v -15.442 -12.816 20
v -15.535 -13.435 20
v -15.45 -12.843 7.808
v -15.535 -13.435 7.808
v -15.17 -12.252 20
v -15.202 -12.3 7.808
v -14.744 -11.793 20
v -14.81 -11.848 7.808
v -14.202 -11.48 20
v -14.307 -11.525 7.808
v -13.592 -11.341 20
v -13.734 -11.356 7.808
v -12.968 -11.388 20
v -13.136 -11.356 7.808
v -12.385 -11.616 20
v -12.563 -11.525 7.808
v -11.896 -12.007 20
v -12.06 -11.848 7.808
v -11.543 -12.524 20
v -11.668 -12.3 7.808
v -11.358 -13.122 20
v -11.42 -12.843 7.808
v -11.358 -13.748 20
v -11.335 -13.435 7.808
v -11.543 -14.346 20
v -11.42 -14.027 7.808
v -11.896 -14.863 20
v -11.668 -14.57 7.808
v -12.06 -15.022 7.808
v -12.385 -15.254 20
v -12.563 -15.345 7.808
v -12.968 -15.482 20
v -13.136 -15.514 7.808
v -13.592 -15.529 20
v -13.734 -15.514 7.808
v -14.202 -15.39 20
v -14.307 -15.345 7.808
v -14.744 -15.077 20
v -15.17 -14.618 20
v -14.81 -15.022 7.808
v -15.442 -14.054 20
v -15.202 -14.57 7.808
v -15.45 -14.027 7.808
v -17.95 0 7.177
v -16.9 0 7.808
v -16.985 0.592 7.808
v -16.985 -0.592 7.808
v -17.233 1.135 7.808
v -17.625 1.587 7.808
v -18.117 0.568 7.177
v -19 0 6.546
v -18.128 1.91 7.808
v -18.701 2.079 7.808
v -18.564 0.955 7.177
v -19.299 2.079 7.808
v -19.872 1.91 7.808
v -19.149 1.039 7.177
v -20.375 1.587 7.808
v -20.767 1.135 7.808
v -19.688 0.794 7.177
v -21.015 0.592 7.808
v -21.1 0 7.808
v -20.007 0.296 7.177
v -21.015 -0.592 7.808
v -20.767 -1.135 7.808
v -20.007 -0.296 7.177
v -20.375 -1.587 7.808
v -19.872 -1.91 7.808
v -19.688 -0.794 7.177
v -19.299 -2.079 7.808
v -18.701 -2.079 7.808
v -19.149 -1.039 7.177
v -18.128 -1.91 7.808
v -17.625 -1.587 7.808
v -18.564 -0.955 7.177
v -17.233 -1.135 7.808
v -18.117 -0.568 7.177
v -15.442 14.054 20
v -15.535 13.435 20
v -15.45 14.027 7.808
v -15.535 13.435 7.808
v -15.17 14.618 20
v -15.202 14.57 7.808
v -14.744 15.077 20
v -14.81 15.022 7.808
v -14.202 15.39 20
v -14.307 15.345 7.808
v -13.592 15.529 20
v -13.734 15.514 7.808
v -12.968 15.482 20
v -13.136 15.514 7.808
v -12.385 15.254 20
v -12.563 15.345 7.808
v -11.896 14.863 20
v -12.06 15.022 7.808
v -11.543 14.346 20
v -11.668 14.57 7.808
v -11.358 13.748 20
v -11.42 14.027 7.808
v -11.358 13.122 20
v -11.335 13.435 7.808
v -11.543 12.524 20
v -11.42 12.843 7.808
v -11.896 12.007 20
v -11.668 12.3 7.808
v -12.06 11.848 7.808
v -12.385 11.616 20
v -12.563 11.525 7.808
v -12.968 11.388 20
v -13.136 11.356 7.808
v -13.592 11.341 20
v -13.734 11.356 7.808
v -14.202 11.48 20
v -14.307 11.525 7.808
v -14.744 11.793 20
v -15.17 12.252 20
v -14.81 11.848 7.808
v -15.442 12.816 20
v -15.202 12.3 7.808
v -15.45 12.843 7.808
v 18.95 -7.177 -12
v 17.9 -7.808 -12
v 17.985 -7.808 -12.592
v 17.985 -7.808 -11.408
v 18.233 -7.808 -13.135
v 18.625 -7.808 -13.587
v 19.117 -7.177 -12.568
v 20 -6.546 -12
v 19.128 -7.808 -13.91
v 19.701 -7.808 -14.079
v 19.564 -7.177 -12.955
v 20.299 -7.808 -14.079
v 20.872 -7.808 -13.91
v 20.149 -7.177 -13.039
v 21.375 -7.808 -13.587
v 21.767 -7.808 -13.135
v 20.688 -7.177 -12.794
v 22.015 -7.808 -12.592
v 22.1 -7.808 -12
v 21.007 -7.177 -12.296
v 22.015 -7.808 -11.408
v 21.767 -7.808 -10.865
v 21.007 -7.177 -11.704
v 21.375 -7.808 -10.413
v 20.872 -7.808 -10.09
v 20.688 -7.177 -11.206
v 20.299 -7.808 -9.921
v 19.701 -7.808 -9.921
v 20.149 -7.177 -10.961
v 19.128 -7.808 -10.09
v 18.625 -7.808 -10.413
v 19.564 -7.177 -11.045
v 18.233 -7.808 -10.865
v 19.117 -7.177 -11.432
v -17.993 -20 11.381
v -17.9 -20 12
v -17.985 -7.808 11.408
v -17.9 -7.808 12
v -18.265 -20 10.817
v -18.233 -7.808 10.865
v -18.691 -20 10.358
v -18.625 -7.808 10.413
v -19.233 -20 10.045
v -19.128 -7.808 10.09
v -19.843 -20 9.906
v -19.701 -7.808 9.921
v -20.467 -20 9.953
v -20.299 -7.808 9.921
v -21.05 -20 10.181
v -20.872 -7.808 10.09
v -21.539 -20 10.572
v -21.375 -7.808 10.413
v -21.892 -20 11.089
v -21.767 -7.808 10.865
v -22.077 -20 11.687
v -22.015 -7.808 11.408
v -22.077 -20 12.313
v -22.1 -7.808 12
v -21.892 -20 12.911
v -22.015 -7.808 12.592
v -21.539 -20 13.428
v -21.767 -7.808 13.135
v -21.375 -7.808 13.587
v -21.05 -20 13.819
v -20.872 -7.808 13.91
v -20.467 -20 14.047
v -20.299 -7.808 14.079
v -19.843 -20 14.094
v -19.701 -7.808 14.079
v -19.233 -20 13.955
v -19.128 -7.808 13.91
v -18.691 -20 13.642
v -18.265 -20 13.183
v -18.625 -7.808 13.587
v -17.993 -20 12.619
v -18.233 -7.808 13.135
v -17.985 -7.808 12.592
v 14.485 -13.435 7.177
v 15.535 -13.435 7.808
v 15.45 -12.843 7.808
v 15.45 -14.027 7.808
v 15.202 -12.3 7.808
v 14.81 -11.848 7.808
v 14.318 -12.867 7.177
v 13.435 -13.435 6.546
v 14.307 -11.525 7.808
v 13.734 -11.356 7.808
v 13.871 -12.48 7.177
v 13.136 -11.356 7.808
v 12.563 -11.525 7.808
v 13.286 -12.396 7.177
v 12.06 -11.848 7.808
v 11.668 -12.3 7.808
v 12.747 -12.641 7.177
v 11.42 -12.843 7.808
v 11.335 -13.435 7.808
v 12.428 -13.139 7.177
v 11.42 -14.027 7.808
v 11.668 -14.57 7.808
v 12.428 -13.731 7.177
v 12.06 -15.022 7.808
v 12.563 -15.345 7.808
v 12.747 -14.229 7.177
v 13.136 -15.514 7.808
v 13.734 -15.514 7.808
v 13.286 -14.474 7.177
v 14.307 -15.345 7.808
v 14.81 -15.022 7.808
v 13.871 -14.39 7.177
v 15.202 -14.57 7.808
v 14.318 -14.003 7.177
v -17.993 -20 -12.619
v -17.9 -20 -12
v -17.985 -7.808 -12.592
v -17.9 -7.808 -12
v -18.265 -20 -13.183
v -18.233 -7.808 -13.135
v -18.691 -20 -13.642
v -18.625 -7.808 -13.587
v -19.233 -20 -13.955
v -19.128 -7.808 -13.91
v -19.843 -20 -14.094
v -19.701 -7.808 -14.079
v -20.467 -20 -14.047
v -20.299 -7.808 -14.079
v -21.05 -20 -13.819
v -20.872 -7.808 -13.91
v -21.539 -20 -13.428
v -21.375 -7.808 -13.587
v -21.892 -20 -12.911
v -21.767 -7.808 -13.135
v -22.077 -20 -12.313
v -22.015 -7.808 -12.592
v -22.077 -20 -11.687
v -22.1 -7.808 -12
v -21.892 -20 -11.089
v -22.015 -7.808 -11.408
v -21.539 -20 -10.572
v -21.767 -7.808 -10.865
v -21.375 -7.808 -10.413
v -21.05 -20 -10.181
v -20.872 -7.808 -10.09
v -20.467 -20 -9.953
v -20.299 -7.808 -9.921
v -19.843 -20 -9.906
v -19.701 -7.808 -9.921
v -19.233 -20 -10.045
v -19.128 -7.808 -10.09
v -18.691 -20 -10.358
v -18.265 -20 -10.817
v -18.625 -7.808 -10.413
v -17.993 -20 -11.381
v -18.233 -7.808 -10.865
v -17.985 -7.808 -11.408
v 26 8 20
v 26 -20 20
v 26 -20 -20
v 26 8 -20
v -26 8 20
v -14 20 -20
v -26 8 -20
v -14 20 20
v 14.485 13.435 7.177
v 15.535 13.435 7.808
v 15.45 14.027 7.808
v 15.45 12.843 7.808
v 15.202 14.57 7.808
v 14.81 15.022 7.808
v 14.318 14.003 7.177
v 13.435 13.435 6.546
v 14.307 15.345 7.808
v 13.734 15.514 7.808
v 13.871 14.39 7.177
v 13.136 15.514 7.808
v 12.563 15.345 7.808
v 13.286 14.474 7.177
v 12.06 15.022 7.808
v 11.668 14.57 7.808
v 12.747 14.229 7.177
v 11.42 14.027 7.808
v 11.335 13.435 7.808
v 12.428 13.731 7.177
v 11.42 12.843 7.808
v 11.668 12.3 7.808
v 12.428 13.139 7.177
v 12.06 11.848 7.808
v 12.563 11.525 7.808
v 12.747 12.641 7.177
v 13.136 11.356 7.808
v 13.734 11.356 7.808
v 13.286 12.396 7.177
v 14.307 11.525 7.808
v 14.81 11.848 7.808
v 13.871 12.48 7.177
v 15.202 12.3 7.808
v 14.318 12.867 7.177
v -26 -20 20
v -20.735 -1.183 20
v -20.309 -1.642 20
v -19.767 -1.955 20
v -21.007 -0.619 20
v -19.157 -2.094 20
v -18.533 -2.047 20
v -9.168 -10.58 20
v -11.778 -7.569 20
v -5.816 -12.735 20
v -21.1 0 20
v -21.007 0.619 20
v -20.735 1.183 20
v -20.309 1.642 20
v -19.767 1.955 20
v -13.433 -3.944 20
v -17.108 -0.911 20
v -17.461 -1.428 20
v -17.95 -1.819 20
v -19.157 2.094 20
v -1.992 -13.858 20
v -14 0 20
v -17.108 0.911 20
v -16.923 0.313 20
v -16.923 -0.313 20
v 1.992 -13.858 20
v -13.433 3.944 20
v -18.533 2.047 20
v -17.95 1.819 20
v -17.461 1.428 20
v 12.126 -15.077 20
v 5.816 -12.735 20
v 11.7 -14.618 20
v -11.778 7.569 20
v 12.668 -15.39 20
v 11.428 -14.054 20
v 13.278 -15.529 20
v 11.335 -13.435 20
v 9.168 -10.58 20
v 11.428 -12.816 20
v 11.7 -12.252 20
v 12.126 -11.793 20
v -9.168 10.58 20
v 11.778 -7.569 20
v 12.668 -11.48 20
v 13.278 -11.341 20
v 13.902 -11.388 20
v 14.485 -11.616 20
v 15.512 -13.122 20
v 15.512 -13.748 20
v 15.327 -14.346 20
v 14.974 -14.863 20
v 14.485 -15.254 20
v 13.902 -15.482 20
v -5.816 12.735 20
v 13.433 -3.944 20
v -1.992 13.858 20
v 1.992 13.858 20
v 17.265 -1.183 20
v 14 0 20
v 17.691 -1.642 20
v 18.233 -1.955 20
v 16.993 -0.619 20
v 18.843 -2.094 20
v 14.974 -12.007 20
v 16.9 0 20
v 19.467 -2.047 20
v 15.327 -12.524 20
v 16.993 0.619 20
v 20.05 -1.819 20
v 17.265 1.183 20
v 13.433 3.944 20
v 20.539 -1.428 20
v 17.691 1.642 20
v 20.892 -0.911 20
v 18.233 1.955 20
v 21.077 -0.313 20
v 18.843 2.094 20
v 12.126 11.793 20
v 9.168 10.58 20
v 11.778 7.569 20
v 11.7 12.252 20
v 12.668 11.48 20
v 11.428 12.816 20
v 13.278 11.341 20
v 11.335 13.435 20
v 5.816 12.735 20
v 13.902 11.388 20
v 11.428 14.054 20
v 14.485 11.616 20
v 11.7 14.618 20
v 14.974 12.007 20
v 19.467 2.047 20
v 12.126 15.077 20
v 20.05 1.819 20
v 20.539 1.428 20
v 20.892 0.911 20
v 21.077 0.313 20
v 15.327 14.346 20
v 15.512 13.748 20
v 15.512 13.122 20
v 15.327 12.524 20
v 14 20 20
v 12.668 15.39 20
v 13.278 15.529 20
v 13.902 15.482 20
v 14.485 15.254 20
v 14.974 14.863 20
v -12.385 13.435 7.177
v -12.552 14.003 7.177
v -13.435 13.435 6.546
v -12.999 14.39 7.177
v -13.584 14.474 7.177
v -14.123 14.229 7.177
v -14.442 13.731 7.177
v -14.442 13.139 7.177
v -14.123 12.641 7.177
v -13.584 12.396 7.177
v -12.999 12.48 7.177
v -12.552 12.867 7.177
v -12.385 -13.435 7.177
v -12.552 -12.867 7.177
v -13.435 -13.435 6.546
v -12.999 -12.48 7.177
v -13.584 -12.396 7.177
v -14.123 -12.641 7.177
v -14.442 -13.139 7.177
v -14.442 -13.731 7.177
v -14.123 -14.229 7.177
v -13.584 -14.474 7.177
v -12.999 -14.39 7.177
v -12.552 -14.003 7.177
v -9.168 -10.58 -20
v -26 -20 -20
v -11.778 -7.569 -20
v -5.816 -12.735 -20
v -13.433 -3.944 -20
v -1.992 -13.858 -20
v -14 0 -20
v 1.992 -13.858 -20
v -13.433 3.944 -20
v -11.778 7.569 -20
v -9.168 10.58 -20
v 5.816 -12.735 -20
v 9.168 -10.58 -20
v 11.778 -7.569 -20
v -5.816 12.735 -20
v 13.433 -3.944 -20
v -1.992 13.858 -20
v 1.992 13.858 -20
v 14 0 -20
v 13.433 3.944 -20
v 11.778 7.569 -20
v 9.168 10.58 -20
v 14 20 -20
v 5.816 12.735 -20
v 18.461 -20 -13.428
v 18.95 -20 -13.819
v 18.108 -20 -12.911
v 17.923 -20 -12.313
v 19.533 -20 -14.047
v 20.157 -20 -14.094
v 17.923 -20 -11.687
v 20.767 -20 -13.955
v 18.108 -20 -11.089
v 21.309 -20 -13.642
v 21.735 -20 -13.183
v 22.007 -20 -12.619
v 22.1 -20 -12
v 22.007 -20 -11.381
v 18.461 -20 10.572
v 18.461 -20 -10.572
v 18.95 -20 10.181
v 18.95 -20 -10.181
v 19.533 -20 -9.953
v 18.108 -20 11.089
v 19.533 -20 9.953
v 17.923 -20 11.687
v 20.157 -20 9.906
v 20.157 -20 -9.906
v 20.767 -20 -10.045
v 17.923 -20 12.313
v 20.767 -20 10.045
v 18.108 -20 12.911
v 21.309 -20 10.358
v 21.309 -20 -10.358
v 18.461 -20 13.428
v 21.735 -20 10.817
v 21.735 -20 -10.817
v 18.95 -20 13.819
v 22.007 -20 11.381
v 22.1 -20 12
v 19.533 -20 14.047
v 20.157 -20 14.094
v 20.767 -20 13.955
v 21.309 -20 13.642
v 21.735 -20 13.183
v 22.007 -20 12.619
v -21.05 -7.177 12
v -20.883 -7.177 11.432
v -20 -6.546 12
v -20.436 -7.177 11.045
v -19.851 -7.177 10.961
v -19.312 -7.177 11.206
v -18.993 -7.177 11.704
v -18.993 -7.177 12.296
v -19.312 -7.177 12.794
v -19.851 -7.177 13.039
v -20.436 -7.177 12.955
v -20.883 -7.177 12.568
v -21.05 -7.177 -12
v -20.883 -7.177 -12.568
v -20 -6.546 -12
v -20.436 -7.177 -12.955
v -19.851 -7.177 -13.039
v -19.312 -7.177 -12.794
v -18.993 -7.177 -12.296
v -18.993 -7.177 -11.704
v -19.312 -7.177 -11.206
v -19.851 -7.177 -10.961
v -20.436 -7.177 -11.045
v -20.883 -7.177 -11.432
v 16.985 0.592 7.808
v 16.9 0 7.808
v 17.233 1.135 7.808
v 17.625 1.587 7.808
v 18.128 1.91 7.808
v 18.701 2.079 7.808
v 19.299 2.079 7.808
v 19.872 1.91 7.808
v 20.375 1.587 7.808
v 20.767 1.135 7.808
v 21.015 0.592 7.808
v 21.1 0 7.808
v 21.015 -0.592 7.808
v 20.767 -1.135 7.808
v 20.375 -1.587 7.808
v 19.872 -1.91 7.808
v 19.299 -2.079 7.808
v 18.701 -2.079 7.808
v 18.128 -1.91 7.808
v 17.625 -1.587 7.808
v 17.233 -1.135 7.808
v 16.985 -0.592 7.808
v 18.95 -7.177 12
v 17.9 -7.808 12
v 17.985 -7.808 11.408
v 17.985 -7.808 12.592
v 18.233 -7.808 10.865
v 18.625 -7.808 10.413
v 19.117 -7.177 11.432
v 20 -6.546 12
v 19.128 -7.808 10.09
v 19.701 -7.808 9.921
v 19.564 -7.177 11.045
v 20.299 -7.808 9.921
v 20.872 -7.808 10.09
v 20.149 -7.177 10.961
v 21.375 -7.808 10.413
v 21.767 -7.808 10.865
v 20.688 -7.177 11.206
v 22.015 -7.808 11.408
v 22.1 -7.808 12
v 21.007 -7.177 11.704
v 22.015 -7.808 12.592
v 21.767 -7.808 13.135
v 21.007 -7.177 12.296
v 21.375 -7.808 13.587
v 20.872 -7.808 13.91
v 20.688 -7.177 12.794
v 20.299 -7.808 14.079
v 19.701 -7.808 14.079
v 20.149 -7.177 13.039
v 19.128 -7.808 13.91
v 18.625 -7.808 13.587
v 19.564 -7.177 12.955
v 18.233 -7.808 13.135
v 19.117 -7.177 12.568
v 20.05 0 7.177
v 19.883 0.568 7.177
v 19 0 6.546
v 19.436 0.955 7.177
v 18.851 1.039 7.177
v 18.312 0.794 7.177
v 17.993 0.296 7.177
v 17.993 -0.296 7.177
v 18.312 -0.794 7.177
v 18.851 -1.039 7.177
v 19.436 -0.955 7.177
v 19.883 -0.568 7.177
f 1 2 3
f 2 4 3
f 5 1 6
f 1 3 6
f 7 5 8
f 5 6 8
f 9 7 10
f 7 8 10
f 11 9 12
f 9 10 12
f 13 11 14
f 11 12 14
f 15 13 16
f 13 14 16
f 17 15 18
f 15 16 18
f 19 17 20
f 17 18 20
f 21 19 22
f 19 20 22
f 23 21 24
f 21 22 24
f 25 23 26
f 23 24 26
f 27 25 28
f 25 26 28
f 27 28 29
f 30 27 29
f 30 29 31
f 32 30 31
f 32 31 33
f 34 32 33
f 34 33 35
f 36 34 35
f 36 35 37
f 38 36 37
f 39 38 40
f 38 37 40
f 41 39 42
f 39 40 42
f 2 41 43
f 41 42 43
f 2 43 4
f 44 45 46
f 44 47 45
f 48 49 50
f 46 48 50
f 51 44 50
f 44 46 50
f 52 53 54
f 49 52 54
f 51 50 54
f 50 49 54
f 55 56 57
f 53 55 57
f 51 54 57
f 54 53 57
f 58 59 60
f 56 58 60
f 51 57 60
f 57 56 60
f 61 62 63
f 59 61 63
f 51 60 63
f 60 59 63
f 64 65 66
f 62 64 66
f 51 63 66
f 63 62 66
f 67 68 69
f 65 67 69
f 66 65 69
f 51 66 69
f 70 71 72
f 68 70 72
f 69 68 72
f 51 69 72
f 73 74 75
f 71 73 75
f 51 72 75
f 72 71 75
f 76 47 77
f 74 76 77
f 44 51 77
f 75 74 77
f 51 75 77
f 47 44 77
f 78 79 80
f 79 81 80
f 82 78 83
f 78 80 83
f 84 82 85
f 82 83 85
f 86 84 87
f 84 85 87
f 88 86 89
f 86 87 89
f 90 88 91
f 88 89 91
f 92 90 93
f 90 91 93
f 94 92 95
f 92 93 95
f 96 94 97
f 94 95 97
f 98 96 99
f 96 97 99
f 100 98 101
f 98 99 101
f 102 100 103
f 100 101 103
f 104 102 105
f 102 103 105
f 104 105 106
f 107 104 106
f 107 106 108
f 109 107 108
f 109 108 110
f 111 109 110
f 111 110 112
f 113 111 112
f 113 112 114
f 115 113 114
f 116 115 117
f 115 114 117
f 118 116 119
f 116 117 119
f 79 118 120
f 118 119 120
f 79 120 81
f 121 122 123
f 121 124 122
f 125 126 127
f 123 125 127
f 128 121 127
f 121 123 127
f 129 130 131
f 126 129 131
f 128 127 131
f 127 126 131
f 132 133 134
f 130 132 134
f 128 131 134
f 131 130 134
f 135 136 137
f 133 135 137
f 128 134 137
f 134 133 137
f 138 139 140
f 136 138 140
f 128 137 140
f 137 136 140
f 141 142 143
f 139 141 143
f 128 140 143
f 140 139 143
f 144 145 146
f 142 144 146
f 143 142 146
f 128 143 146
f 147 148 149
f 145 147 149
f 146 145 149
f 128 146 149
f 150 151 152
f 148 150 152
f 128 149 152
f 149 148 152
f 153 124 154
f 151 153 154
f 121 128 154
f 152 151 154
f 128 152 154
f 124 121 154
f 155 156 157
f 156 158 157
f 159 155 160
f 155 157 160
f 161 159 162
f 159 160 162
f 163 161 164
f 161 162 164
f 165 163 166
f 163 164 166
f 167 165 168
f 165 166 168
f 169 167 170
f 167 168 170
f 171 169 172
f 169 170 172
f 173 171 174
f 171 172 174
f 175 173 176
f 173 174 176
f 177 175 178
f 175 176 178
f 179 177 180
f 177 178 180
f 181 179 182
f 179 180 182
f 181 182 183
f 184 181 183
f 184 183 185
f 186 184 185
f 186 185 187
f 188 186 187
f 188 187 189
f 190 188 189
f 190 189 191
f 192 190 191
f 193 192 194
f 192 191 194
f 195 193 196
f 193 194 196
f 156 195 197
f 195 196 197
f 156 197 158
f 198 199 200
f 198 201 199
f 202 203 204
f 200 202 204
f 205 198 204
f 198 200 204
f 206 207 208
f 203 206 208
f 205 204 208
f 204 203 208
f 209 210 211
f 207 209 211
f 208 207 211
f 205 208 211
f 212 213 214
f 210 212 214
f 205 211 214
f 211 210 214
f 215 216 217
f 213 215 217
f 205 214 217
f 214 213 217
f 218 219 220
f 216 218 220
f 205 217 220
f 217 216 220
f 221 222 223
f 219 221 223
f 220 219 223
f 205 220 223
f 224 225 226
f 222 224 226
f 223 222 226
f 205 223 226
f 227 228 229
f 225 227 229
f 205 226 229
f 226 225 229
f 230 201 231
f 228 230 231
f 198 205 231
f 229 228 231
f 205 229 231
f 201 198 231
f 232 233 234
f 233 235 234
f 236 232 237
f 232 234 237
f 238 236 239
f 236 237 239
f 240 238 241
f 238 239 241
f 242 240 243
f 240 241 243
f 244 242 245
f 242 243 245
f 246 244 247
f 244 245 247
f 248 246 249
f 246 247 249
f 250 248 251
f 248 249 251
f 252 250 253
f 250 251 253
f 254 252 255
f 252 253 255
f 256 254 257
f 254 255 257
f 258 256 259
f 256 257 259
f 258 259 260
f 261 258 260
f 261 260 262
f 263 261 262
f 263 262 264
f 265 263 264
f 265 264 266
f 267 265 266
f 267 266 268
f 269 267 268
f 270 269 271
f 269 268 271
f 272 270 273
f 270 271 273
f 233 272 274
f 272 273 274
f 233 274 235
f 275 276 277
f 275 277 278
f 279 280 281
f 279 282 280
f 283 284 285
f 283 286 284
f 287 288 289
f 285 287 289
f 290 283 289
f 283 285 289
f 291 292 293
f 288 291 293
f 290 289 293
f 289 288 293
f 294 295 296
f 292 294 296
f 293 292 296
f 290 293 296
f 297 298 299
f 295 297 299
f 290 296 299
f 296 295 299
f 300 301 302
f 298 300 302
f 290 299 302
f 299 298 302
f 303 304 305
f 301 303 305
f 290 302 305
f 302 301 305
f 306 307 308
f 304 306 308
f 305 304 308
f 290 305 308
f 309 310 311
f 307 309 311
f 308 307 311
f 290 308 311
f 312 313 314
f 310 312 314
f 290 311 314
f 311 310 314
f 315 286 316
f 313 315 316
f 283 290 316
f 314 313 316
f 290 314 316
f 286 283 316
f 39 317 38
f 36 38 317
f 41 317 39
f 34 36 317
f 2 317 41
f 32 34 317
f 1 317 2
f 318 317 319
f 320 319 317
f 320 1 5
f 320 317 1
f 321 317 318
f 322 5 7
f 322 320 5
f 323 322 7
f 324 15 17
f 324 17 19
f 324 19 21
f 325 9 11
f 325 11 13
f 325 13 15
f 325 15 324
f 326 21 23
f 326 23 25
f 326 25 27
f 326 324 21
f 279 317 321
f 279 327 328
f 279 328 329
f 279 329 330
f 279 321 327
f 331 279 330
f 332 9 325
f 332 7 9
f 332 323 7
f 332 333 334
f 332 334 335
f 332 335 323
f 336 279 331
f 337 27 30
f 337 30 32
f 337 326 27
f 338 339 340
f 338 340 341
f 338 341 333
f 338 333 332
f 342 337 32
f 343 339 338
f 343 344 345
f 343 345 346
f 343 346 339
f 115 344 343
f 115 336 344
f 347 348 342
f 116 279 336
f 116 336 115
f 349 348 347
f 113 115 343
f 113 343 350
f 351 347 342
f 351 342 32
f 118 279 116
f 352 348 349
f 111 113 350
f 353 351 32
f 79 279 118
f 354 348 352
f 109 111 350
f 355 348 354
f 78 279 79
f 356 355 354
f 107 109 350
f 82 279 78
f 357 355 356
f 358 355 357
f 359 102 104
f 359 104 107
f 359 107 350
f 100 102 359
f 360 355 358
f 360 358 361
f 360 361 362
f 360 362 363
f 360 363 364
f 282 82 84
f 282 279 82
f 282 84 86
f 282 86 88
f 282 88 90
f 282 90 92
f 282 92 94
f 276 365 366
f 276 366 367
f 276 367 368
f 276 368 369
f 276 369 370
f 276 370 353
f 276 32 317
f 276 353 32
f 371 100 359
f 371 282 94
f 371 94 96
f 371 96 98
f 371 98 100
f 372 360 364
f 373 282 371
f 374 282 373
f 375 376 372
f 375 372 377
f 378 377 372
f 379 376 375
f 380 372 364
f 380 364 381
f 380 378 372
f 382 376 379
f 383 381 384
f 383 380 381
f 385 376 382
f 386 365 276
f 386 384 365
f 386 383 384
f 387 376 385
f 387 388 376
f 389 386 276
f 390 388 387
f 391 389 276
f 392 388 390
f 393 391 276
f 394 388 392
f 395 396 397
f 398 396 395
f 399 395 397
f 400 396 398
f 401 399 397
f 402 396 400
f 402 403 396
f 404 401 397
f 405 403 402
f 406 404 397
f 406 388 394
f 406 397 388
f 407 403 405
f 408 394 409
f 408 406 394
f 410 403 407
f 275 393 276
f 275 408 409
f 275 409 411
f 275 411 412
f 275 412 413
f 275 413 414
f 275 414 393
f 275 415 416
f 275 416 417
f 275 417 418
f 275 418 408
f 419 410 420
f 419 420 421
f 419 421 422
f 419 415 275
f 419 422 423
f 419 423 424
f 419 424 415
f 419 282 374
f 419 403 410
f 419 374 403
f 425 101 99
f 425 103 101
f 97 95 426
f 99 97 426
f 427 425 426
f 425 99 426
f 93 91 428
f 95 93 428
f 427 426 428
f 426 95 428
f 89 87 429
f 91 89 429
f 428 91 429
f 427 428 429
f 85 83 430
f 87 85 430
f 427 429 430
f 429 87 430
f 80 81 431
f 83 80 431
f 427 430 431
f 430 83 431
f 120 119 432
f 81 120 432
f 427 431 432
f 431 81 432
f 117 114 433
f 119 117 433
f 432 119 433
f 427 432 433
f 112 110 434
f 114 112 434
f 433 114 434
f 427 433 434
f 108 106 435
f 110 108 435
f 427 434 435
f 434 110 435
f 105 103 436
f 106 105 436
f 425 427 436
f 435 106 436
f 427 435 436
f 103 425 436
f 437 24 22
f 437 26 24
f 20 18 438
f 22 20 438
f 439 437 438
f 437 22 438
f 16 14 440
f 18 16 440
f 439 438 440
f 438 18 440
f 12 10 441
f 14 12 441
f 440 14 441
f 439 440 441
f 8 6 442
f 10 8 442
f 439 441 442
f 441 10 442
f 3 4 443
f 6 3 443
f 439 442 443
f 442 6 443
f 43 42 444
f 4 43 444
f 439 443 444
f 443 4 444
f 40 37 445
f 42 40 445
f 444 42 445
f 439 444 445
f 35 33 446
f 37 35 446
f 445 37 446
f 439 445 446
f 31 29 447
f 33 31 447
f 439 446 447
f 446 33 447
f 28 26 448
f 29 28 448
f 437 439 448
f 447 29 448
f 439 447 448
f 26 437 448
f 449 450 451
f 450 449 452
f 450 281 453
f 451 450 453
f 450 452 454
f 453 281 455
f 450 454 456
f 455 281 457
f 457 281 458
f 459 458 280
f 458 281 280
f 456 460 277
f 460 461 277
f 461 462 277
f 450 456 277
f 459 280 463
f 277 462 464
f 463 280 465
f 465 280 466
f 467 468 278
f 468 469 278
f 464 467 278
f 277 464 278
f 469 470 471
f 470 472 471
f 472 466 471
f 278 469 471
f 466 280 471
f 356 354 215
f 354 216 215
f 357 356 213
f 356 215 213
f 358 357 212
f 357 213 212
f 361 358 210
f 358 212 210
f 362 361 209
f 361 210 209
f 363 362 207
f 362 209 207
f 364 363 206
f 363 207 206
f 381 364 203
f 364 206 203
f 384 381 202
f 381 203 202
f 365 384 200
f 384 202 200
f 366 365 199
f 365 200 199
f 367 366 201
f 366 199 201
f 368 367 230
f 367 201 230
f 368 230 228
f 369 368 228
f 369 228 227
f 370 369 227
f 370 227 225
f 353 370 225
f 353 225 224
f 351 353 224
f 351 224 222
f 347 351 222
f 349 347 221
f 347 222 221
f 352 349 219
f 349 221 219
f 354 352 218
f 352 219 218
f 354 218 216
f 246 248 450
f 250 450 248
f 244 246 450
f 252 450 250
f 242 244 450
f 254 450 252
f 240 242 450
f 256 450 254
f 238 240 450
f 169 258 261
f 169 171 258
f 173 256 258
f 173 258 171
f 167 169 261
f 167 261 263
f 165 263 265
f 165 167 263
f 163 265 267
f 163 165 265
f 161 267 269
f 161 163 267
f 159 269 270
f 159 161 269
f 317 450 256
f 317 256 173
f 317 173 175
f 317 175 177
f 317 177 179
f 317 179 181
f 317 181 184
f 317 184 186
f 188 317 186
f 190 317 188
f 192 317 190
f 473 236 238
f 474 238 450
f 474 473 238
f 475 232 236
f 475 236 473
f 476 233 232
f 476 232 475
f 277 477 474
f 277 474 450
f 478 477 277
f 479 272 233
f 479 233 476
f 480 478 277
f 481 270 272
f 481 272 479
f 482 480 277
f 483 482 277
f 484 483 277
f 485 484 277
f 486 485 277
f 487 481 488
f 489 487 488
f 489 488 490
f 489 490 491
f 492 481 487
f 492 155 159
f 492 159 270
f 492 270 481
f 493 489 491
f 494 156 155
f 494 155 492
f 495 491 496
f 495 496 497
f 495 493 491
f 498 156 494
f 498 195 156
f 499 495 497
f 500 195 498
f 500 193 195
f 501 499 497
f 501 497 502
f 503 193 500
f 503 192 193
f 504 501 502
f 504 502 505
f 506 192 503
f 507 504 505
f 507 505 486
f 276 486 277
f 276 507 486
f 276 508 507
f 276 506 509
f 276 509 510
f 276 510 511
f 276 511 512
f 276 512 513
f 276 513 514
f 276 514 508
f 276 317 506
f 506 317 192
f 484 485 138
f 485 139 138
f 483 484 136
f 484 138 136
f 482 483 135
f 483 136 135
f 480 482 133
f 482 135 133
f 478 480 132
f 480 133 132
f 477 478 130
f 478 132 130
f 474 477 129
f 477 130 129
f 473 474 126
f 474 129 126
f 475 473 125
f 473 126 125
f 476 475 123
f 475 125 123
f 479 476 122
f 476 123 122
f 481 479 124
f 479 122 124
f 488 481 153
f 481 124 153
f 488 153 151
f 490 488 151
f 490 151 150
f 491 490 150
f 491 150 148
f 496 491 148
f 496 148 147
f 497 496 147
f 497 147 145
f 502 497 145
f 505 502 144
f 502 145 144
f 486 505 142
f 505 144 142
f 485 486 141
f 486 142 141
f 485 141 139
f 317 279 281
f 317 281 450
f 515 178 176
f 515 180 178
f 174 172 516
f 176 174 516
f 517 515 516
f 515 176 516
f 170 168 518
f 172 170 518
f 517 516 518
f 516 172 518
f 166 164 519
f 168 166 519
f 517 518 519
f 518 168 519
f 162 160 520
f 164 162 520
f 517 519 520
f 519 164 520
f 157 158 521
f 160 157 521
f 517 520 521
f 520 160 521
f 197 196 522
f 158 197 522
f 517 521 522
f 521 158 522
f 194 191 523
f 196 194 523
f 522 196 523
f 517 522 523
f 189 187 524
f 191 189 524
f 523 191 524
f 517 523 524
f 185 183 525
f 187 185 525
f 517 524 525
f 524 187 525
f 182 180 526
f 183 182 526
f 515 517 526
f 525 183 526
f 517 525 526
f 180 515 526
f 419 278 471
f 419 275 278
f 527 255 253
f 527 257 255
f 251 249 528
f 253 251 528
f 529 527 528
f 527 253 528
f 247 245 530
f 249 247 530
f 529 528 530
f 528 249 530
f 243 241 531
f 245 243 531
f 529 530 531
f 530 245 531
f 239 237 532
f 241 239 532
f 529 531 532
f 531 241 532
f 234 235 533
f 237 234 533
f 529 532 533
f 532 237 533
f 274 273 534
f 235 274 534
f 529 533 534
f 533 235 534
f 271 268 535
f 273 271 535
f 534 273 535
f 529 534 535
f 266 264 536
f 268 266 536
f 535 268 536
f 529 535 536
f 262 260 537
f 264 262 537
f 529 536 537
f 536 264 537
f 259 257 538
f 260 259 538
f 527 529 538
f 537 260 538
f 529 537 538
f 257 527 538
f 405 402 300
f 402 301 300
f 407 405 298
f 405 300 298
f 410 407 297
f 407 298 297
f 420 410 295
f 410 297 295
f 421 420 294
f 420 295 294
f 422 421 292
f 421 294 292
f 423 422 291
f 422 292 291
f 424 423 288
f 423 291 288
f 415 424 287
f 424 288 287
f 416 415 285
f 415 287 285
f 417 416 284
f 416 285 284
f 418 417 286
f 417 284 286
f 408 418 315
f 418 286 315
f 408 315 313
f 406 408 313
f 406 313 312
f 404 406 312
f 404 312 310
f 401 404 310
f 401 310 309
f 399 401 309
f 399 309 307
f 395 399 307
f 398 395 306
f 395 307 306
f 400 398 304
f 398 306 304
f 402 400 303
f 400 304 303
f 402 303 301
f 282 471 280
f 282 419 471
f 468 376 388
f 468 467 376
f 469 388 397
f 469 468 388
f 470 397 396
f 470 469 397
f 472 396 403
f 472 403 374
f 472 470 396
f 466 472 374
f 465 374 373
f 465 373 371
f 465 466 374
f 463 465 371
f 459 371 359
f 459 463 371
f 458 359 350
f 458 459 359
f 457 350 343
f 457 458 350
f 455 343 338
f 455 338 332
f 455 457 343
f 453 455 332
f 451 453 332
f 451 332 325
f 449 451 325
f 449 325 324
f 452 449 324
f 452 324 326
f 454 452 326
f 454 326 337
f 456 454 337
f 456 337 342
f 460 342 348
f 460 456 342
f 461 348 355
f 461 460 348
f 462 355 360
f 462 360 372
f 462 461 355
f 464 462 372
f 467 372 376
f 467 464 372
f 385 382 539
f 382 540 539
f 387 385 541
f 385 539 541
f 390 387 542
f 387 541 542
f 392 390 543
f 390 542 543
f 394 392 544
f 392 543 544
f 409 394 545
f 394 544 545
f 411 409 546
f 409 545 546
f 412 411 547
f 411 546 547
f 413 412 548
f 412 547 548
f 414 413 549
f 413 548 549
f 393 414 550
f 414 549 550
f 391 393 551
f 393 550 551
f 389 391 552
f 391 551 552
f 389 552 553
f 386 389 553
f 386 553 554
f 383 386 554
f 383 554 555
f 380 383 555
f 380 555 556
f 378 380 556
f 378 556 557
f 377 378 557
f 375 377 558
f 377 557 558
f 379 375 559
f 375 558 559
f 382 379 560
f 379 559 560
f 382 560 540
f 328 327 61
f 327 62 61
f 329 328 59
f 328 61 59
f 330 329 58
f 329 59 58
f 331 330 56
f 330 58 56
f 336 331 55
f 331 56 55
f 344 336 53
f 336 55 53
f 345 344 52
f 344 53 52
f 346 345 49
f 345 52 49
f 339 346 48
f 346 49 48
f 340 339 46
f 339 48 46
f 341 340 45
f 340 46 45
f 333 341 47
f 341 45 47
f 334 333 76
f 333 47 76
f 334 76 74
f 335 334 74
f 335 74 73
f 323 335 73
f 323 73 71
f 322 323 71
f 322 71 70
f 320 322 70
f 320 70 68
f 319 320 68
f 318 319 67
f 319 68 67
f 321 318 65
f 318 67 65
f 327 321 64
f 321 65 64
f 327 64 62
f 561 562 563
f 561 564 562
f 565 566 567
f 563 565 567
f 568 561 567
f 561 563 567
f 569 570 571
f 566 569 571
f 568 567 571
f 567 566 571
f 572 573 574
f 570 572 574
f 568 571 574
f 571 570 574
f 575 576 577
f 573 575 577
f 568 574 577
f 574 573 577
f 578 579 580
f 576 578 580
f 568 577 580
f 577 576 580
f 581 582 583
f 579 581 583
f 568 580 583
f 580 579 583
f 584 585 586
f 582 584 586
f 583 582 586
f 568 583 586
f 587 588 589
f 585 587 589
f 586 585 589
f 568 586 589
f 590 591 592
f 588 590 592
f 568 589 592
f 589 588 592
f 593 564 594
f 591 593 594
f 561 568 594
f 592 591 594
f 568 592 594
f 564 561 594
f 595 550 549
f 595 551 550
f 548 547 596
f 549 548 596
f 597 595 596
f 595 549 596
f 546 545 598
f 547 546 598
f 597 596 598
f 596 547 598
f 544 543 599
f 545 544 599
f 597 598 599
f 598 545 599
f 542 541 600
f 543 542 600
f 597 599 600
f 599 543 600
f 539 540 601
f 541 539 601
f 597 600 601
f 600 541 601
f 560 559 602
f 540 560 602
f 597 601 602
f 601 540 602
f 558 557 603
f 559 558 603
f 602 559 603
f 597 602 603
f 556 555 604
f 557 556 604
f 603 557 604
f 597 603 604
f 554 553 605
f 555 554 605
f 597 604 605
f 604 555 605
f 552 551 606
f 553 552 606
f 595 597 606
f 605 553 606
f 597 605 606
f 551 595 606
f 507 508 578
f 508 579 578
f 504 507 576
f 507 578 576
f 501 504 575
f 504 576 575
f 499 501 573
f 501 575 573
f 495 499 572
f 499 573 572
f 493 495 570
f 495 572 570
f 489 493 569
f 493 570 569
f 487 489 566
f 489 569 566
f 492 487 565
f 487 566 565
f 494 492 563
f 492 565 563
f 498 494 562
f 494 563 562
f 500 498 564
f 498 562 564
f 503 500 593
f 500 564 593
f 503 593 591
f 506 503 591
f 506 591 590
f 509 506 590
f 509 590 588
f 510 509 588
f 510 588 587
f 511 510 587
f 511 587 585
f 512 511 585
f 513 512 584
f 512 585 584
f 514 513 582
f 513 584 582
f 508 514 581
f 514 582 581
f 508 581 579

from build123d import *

# Parameters (mm, degrees)
SKETCH1_R                 = 14
BOSS_EXTRUDE1_DEPTH       = 20
M5X0_8_TAPPED_HOLE1_D     = 4.2
M5X0_8_TAPPED_HOLE1_DEPTH = 12.192
M5X0_8_TAPPED_HOLE1_TIP   = 1.2618073
M5X0_8_TAPPED_HOLE2_D     = 4.2
M5X0_8_TAPPED_HOLE2_DEPTH = 12.192
M5X0_8_TAPPED_HOLE2_TIP   = 1.2618073


with BuildPart() as part:
    # Sketch1 → Boss-Extrude1 (new body, symmetric)
    with BuildSketch(Plane.XY):
        Polygon((-14, 20), (-26, 8), (-26, -20), (26, -20), (26, 8), (14, 20), align=None)
        Circle(SKETCH1_R, mode=Mode.SUBTRACT)
    extrude(amount=BOSS_EXTRUDE1_DEPTH, both=True)

    # M5x0.8 Tapped Hole1
    with Locations(Plane.XY.offset(20)):
        with Locations((0, 0), (19, 0), (-19, 0), (-13.435028843, 13.435028843), (13.435028843, -13.435028843), (13.435028843, 13.435028843), (-13.435028843, -13.435028843)):
            Hole(M5X0_8_TAPPED_HOLE1_D / 2, depth=M5X0_8_TAPPED_HOLE1_DEPTH)
            with Locations((0, 0, -(M5X0_8_TAPPED_HOLE1_DEPTH + M5X0_8_TAPPED_HOLE1_TIP / 2))):  # 118° drill point
                Cone(0, M5X0_8_TAPPED_HOLE1_D / 2, M5X0_8_TAPPED_HOLE1_TIP, mode=Mode.SUBTRACT)

    # M5x0.8 Tapped Hole2
    with Locations(Plane(origin=(0, -20, 0), x_dir=(-1, 0, 0), z_dir=(0, -1, 0))):
        with Locations((20, -12), (-20, -12), (-20, 12), (20, 12)):
            Hole(M5X0_8_TAPPED_HOLE2_D / 2, depth=M5X0_8_TAPPED_HOLE2_DEPTH)
            with Locations((0, 0, -(M5X0_8_TAPPED_HOLE2_DEPTH + M5X0_8_TAPPED_HOLE2_TIP / 2))):  # 118° drill point
                Cone(0, M5X0_8_TAPPED_HOLE2_D / 2, M5X0_8_TAPPED_HOLE2_TIP, mode=Mode.SUBTRACT)


solid = part.part
